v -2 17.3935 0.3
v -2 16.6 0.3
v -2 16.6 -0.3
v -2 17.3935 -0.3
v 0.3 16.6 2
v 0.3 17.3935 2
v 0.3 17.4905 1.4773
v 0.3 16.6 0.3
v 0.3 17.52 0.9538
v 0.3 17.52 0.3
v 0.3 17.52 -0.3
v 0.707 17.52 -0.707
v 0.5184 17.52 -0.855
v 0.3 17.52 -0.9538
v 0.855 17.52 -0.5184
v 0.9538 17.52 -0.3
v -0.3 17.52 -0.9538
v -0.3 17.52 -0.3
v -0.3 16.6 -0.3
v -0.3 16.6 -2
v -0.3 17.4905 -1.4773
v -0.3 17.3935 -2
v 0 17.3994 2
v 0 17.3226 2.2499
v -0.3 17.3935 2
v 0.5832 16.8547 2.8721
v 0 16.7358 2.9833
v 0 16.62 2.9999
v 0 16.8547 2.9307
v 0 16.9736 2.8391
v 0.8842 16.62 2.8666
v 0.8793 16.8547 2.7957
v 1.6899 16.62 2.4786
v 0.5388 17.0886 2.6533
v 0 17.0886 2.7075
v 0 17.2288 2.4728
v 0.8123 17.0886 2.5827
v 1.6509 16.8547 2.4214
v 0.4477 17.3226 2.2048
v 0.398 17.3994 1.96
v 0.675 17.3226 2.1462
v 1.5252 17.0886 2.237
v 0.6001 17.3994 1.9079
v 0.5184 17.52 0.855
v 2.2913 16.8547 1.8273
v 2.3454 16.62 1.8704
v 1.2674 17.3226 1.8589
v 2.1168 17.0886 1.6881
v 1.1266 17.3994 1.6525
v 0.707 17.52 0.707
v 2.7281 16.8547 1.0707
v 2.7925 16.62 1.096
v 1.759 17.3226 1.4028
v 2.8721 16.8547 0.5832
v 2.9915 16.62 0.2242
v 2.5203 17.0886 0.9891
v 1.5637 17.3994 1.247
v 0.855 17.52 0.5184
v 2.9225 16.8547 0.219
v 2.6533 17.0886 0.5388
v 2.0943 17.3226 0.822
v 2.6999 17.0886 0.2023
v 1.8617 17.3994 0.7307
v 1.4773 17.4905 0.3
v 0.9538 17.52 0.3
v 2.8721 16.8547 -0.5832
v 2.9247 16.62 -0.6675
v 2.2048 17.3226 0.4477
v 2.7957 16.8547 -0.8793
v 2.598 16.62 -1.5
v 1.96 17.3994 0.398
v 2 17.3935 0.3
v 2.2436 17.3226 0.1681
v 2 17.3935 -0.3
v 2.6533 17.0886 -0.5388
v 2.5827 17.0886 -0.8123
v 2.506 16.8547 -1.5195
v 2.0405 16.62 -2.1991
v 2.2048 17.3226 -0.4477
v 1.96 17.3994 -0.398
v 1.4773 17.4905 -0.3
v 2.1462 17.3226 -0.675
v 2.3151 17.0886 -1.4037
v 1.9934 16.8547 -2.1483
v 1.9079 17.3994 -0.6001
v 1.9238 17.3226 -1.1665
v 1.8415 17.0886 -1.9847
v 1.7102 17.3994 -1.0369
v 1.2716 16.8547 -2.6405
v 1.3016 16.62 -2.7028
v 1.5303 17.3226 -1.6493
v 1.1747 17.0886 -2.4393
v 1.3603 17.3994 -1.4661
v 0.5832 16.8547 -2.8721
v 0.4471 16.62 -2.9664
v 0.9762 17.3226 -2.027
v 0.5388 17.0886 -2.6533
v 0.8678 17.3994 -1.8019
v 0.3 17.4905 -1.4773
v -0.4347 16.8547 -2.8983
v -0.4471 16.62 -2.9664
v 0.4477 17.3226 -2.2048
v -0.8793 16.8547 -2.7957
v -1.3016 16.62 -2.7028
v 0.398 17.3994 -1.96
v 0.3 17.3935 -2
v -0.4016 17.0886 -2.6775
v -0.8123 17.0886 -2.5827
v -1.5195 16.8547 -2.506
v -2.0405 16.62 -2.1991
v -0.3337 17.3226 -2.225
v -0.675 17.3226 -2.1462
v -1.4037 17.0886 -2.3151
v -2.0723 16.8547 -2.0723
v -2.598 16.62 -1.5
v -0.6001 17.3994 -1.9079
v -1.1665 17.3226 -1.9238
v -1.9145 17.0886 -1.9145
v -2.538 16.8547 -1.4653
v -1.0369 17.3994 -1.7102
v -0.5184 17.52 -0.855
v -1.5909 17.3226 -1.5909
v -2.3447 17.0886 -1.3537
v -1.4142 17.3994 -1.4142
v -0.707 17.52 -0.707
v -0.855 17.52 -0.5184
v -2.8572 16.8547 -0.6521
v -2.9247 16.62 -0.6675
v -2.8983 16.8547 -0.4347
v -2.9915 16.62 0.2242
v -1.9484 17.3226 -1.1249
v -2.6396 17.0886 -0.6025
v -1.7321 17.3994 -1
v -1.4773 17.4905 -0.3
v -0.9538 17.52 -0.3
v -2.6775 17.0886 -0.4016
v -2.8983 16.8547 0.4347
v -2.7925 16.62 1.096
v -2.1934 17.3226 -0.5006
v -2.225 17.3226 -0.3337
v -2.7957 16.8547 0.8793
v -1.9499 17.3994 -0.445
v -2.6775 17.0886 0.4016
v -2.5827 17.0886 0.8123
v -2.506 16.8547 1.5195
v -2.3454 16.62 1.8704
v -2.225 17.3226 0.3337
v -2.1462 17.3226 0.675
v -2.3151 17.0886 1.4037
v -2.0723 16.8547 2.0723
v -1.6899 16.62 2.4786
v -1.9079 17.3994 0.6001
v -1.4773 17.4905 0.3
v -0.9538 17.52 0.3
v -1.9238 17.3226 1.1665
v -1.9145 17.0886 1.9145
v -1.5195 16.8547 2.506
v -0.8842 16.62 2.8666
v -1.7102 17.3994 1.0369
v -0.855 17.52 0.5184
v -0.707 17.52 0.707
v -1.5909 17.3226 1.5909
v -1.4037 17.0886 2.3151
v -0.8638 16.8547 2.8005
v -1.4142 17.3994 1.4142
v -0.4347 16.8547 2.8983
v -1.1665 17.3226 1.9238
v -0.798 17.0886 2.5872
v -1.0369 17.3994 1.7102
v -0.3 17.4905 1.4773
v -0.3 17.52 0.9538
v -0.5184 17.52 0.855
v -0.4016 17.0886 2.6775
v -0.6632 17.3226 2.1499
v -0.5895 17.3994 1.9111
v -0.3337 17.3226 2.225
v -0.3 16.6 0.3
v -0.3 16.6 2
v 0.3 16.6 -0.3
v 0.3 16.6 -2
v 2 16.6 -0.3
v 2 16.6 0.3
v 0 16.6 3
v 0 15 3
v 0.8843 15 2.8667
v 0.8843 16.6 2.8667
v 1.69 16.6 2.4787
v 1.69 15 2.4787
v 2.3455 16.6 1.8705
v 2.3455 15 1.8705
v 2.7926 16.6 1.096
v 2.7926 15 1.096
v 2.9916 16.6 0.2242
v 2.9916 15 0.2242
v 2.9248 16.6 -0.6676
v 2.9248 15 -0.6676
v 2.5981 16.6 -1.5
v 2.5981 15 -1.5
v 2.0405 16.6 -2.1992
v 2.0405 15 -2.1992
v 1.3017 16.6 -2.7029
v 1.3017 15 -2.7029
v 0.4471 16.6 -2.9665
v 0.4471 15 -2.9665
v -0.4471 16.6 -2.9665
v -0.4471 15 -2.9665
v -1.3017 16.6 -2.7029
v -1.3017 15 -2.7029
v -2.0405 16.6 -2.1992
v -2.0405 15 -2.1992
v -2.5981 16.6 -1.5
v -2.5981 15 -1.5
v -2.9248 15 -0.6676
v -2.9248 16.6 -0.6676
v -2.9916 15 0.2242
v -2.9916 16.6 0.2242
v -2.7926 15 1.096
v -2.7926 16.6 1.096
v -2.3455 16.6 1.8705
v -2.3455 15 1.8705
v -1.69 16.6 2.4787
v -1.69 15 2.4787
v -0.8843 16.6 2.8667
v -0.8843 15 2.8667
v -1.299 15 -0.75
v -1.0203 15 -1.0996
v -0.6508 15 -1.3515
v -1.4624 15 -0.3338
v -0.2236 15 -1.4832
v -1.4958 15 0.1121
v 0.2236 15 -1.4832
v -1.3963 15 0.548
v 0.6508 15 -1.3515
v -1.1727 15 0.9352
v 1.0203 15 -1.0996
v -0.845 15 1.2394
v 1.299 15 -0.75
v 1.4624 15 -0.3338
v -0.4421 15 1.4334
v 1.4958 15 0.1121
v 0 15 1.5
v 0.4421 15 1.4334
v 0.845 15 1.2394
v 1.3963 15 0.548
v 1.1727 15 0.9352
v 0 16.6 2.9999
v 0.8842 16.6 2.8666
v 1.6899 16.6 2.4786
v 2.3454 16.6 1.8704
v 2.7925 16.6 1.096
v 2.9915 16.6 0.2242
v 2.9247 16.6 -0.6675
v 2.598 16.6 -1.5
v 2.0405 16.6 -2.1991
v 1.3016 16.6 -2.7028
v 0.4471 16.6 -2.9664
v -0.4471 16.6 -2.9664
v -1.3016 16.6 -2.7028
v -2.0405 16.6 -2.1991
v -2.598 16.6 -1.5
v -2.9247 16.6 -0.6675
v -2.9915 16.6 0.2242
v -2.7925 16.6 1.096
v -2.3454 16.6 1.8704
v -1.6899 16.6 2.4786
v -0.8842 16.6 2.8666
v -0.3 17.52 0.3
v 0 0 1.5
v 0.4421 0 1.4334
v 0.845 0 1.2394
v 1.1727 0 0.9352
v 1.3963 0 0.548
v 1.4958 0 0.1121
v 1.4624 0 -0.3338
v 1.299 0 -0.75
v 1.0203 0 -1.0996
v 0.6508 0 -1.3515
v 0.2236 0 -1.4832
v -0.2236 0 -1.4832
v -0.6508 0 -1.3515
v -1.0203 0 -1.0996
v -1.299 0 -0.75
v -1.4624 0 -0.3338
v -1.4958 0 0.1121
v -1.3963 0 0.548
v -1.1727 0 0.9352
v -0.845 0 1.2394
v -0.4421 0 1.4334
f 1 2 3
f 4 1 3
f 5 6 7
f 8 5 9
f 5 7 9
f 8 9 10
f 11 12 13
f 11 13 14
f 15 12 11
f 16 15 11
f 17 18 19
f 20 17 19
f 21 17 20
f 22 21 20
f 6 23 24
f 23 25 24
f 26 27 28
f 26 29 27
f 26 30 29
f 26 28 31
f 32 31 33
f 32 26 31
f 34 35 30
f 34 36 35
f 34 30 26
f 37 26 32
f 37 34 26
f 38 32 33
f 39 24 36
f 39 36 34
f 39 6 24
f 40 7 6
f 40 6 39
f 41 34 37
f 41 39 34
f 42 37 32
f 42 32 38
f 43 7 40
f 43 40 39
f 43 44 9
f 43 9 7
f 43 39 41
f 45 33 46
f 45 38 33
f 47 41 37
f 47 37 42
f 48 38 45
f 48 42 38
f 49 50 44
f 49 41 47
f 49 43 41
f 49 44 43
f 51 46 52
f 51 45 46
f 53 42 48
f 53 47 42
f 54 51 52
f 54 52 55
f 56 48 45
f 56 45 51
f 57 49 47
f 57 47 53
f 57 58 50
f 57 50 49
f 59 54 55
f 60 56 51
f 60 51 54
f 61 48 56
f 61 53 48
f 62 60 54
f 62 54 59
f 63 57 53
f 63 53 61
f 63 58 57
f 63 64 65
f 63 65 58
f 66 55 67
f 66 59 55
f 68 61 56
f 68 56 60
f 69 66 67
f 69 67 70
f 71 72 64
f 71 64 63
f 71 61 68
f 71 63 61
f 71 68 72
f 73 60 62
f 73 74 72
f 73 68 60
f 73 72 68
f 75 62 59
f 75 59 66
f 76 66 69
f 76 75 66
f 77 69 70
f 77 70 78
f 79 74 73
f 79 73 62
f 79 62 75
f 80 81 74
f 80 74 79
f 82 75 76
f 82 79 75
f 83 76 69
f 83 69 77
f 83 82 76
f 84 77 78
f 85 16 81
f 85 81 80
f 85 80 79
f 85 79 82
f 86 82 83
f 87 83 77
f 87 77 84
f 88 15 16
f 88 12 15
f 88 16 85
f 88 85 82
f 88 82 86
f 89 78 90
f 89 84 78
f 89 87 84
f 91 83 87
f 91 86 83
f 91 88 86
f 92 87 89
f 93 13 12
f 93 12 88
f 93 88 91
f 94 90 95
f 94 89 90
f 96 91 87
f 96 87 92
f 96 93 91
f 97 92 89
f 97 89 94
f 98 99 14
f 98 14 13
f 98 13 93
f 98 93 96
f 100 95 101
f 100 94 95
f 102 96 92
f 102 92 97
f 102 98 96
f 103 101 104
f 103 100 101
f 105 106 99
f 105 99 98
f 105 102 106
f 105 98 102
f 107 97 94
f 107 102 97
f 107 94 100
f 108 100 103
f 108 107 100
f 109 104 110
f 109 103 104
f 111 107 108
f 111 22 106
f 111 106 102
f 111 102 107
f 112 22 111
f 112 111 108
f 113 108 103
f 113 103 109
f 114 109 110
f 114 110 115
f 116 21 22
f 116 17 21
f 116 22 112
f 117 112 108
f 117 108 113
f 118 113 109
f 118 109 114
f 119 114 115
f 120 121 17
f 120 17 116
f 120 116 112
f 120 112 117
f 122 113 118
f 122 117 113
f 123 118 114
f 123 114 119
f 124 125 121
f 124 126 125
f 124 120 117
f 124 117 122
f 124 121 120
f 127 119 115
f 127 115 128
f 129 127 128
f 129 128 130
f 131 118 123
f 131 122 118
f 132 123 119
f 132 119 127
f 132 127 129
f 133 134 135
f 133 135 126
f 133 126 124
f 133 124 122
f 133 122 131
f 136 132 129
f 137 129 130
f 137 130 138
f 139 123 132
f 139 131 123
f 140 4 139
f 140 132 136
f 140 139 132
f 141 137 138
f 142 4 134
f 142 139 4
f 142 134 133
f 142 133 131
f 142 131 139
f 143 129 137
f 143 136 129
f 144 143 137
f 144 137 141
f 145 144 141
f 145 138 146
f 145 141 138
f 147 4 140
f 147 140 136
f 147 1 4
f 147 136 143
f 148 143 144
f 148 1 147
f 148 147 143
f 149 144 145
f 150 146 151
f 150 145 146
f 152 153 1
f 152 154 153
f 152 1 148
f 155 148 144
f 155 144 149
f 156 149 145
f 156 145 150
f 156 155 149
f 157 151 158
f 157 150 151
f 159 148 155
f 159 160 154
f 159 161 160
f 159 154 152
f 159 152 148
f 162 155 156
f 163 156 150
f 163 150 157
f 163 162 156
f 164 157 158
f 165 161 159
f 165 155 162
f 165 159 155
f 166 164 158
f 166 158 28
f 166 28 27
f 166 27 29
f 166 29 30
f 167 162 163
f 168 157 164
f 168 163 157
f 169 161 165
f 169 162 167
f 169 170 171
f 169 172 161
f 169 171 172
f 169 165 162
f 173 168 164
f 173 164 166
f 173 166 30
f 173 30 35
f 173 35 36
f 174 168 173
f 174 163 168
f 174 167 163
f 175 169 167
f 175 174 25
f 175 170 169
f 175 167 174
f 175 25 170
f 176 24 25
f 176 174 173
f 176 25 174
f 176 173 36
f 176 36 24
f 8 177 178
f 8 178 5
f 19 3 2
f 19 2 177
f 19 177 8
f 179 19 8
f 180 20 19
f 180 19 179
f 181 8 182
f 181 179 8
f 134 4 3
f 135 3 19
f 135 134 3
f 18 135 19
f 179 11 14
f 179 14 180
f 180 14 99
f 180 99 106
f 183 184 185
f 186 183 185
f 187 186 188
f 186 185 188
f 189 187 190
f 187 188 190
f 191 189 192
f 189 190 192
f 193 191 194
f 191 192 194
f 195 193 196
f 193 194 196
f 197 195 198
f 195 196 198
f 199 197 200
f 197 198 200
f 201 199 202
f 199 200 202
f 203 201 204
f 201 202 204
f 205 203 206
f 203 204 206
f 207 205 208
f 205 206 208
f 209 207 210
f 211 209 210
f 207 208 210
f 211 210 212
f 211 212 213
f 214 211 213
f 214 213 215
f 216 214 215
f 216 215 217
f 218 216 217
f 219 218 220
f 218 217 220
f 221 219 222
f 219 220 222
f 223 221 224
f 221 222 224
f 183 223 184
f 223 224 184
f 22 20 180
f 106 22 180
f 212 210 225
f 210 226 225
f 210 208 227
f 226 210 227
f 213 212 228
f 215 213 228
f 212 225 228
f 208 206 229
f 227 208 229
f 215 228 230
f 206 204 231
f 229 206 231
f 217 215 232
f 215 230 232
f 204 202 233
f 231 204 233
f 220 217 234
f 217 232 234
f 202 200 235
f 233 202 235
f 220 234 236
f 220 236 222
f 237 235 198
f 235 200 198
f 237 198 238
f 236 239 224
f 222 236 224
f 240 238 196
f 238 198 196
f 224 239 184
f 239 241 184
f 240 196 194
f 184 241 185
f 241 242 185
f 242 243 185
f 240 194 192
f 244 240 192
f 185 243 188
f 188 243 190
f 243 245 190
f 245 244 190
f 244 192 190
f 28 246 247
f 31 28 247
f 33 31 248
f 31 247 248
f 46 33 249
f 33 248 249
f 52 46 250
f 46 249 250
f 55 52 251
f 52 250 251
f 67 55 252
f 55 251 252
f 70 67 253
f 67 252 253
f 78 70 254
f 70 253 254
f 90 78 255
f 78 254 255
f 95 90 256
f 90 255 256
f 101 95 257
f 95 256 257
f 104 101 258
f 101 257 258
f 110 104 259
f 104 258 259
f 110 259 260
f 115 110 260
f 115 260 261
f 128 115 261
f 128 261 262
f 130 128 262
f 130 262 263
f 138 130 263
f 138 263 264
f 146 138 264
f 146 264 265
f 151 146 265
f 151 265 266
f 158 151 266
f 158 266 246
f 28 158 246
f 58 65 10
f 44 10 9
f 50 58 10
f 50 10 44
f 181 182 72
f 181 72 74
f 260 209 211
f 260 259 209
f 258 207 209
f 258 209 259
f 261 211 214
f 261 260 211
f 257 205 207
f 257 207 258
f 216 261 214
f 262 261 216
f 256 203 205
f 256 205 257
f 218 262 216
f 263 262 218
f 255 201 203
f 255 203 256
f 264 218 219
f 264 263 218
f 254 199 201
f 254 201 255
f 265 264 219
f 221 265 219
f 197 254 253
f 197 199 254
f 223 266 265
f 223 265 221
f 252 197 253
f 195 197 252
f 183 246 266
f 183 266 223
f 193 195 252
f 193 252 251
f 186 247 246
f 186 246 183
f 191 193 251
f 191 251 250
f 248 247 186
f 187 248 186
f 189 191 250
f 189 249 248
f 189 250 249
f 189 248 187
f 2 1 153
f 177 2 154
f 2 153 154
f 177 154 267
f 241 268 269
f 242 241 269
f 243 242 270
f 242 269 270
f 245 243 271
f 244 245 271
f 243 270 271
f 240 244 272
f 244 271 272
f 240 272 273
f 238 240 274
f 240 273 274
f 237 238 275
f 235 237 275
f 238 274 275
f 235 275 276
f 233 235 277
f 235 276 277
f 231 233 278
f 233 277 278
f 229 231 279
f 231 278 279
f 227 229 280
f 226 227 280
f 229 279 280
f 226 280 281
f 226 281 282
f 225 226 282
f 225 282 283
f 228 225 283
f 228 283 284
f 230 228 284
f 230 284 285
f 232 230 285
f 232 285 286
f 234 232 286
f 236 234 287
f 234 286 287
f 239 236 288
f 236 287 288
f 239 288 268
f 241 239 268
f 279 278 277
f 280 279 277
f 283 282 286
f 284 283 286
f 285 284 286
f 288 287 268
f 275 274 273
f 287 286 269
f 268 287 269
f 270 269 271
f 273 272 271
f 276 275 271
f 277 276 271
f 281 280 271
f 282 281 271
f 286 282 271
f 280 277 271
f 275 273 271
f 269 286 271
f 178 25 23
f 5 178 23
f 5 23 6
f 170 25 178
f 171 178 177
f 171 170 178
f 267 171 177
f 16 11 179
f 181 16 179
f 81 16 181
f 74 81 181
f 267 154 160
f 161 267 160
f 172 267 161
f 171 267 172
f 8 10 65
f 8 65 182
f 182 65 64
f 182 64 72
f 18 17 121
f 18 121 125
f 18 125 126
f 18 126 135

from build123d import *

# Parameters (mm, degrees)
SKICA1_R                 = 1.5
P_IDAT_VYSUNUT_M1_DEPTH  = 15
SKICA2_R                 = 3
P_IDAT_VYSUNUT_M2_DEPTH  = 1.6
SKICA3_R                 = 2.999911278
P_IDAT_VYSUNUT_M3_DEPTH  = 0.92
ZAOBLIT1_SIZE            = 0.9
ZAOBLIT1_SIZE_2          = 2
SKICA4_W                 = 0.6
SKICA4_H                 = 4
SKICA4_W_2               = 4
SKICA4_H_2               = 0.6
ODEBRAT_VYSUNUT_M1_DEPTH = 0.92


with BuildPart() as part:
    # Skica1 → Přidat vysunutím1 (new body)
    with BuildSketch(Plane(origin=(0, 0, 0), x_dir=(1, 0, 0), z_dir=(0, 1, 0))):
        with Locations(Location((0, 0, 0), (0, 0, 270))):
            Circle(SKICA1_R)
    extrude(amount=P_IDAT_VYSUNUT_M1_DEPTH)

    # Skica2 → Přidat vysunutím2 (add)
    with BuildSketch(Plane(origin=(0, 15, 0), x_dir=(1, 0, 0), z_dir=(0, 1, 0))):
        with Locations(Location((0, 0, 0), (0, 0, 270))):
            Circle(SKICA2_R)
    extrude(amount=P_IDAT_VYSUNUT_M2_DEPTH)

    # Skica3 → Přidat vysunutím3 (add)
    with BuildSketch(Plane(origin=(0, 16.6, 0), x_dir=(1, 0, 0), z_dir=(0, 1, 0))):
        with Locations(Location((0, 0, 0), (0, 0, 270))):
            Circle(SKICA3_R)
    extrude(amount=P_IDAT_VYSUNUT_M3_DEPTH)

    # Zaoblit1
    # an asymmetric fillet: 2, 0.9 mm, written as the material it takes off along each edge
    with BuildSketch(Plane(origin=(0, 17.52, 0), x_dir=(0, 0, 1), z_dir=(-1, 0, 0))) as zaoblit1_piece_1:
        with BuildLine():
            Bezier((2.999911278, -ZAOBLIT1_SIZE), (2.999911278, 0), (2.999911278 - ZAOBLIT1_SIZE_2, 0), weights=[1, 0.707106781, 1])
            Line((2.999911278 - ZAOBLIT1_SIZE_2, 0), (2.999911278, 0))
            Line((2.999911278, 0), (2.999911278, -ZAOBLIT1_SIZE))
        make_face()
    revolve(axis=Axis((0, 17.52, 0), (0, 1, 0)), mode=Mode.SUBTRACT)

    # Skica4 → Odebrat vysunutím1 (cut)
    with BuildSketch(Plane(origin=(0, 17.52, 0), x_dir=(1, 0, 0), z_dir=(0, 1, 0))):
        Rectangle(SKICA4_W, SKICA4_H)
        Rectangle(SKICA4_W_2, SKICA4_H_2)
    extrude(amount=-ODEBRAT_VYSUNUT_M1_DEPTH, mode=Mode.SUBTRACT)


solid = part.part
